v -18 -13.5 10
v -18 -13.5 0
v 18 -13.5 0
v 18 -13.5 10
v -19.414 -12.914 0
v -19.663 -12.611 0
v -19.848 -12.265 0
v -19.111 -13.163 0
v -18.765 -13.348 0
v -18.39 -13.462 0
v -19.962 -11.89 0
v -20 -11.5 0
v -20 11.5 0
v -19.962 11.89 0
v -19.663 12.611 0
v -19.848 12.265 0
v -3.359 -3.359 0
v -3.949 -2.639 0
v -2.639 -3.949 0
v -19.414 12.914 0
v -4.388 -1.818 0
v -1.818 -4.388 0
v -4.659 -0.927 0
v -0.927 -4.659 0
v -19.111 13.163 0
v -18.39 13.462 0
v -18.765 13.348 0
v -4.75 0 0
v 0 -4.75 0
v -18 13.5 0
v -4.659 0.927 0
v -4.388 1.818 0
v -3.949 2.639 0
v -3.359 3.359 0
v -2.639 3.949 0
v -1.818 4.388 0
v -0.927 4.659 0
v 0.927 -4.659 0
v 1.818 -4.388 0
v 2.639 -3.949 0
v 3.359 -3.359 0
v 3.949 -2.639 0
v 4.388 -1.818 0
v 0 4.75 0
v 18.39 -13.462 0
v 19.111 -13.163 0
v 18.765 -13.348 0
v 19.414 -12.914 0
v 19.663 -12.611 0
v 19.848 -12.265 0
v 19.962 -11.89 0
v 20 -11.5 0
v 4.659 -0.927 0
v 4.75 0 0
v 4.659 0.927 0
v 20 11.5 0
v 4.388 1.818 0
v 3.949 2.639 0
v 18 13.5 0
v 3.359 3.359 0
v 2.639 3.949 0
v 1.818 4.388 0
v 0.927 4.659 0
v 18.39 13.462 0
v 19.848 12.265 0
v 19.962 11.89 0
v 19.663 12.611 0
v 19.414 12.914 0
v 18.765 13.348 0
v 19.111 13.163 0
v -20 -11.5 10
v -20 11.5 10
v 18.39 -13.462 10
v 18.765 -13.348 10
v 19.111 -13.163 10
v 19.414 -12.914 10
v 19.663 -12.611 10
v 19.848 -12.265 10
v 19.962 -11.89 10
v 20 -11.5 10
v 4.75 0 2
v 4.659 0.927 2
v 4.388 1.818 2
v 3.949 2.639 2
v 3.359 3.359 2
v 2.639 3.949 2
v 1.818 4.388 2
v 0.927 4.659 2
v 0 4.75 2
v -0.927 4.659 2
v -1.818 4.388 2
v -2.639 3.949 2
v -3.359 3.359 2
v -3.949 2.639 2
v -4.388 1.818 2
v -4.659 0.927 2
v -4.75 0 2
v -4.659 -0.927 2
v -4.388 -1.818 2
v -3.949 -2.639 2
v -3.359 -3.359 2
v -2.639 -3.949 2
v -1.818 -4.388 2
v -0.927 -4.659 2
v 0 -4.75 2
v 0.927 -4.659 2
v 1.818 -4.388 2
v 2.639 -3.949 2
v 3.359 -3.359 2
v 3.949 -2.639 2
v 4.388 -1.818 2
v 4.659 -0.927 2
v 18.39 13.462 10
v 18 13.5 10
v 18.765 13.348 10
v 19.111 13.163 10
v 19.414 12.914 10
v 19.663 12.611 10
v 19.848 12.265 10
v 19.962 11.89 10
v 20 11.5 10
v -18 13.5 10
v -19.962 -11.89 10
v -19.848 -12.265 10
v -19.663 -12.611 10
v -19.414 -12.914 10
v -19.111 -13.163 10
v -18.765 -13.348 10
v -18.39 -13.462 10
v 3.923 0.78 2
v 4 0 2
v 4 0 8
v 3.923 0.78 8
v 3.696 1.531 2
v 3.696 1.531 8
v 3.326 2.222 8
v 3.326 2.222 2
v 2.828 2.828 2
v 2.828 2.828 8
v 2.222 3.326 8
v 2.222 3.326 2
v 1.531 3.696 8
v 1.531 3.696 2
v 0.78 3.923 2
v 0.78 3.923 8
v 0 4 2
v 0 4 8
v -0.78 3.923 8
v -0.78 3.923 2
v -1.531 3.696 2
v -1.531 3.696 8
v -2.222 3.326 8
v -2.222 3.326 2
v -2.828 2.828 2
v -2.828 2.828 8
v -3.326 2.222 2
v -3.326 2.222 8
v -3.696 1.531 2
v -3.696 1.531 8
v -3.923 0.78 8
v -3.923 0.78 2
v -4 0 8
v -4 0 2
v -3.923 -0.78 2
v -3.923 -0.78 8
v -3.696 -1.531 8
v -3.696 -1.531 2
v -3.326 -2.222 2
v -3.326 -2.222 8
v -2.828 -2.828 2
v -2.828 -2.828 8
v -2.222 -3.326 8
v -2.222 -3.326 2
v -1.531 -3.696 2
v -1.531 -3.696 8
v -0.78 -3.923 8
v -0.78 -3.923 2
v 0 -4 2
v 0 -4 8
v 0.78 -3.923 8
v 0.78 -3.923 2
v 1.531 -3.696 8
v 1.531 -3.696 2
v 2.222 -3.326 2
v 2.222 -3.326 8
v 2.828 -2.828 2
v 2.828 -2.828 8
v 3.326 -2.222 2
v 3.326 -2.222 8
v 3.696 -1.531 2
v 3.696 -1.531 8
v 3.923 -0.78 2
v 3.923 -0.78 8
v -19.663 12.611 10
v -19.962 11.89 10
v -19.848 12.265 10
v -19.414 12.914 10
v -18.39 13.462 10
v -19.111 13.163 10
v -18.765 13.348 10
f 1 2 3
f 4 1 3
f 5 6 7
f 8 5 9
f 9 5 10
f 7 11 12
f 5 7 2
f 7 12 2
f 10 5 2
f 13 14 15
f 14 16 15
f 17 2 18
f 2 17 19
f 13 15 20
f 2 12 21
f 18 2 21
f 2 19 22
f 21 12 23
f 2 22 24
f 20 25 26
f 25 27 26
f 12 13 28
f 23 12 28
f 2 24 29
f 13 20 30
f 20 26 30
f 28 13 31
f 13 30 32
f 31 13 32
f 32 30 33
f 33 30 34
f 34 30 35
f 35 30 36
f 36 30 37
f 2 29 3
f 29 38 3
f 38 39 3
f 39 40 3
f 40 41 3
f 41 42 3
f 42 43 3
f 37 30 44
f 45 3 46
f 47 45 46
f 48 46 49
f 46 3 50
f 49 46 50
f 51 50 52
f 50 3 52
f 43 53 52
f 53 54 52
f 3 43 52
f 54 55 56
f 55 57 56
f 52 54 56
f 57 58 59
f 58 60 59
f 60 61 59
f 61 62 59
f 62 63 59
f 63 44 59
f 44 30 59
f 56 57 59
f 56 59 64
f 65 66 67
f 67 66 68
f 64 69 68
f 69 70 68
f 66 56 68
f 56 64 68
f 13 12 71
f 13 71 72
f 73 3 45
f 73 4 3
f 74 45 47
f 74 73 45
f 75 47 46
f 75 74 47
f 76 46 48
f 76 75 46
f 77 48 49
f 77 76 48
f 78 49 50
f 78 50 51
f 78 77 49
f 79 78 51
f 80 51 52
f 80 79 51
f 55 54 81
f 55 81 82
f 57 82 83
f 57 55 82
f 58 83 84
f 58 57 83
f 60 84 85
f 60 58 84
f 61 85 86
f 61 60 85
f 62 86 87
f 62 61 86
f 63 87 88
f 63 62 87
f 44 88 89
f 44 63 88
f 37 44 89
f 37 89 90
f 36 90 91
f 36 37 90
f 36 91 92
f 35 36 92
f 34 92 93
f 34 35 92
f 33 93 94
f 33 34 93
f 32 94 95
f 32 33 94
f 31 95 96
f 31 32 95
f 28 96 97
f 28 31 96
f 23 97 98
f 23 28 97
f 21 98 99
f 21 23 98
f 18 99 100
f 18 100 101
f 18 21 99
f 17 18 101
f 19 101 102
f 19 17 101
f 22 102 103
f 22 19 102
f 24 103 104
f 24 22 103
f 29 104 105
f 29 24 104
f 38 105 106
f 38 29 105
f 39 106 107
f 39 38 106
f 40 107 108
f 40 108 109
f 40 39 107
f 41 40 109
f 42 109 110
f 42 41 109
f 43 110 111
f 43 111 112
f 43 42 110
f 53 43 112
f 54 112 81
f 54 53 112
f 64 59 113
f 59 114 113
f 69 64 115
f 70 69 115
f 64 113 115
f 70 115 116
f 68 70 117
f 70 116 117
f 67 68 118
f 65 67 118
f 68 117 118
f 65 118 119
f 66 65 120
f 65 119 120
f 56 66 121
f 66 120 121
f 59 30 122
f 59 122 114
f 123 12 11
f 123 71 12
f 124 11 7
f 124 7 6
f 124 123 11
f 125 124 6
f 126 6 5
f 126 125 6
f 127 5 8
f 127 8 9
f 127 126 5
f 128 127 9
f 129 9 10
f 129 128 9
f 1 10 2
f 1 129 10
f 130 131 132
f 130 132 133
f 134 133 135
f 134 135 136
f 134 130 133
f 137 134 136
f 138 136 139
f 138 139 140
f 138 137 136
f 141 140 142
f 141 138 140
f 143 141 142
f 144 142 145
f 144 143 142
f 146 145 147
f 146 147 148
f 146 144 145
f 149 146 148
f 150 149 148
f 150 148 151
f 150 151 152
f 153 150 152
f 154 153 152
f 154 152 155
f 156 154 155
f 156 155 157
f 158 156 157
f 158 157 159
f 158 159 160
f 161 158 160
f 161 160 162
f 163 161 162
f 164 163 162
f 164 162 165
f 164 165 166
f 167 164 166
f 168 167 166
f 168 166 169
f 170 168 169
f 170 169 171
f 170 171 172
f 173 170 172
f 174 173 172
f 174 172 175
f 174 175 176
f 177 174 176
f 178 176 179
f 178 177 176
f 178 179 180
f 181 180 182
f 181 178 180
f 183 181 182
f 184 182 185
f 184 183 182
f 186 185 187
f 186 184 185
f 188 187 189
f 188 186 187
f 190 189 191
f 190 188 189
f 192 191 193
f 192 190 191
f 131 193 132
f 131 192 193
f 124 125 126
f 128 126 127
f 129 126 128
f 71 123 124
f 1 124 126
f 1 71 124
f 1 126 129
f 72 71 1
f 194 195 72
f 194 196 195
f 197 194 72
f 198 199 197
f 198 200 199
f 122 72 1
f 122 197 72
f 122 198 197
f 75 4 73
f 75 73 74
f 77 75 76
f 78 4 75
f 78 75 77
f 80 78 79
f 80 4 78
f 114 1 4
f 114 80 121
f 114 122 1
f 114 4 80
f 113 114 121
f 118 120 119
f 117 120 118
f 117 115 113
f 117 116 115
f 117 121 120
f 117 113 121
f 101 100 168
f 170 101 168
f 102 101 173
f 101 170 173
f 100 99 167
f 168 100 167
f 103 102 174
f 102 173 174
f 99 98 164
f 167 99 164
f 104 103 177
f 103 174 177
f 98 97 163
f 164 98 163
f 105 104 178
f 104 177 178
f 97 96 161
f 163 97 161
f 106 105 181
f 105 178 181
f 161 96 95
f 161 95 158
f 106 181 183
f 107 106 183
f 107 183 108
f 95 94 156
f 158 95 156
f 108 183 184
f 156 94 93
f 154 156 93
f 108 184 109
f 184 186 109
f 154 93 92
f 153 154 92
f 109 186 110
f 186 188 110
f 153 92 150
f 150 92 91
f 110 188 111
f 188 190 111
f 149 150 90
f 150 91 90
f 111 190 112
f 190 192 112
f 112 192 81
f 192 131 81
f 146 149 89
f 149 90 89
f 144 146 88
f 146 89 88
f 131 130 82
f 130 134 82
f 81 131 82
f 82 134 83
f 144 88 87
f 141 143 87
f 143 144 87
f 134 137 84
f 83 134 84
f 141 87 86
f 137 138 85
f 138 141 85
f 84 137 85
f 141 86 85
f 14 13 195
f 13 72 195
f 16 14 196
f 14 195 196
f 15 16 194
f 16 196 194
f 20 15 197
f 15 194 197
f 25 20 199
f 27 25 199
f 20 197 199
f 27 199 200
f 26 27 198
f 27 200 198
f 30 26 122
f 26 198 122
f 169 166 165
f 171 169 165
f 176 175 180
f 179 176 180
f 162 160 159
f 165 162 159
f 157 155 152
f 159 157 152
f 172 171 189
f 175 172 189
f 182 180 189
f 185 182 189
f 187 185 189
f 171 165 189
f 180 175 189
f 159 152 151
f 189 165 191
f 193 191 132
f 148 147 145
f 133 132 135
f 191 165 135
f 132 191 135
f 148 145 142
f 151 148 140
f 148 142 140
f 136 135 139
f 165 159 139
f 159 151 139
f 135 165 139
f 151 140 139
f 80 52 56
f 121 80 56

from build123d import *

# Parameters (mm, degrees)
F0_W     = 40
F0_H     = 27
F0_R     = 4.75
F0_R_2   = 4
F1_DEPTH = 10
F2_DEPTH = 2
F3_R     = 2
F4_DEPTH = 8


with BuildPart() as f1:
    # F0 (on Top) → F1 (new body)
    with BuildSketch(Plane.XY):
        Rectangle(F0_W, F0_H)
        Circle(F0_R, mode=Mode.SUBTRACT)
        Circle(F0_R)
        Circle(F0_R_2, mode=Mode.SUBTRACT)
        Circle(F0_R_2)
    extrude(amount=F1_DEPTH)

    # F0 (on Top) → F2 (cut)
    with BuildSketch(Plane.XY):
        Circle(F0_R)
        Circle(F0_R_2, mode=Mode.SUBTRACT)
    extrude(amount=F2_DEPTH, mode=Mode.SUBTRACT)

    # F3
    f3_edges = [f1.edges().sort_by_distance(p)[0] for p in [
        (20, -13.5, 5),
        (20, 13.5, 5),
        (-20, 13.5, 5),
        (-20, -13.5, 5),
    ]]
    fillet(f3_edges, radius=F3_R)

    # F4 (cut): a face of the model
    f4_faces = [f1.faces().sort_by_distance(p)[0] for p in [
        (0, 0, 0),
    ]]
    extrude(f4_faces, amount=-F4_DEPTH, mode=Mode.SUBTRACT)


solid = f1.part
